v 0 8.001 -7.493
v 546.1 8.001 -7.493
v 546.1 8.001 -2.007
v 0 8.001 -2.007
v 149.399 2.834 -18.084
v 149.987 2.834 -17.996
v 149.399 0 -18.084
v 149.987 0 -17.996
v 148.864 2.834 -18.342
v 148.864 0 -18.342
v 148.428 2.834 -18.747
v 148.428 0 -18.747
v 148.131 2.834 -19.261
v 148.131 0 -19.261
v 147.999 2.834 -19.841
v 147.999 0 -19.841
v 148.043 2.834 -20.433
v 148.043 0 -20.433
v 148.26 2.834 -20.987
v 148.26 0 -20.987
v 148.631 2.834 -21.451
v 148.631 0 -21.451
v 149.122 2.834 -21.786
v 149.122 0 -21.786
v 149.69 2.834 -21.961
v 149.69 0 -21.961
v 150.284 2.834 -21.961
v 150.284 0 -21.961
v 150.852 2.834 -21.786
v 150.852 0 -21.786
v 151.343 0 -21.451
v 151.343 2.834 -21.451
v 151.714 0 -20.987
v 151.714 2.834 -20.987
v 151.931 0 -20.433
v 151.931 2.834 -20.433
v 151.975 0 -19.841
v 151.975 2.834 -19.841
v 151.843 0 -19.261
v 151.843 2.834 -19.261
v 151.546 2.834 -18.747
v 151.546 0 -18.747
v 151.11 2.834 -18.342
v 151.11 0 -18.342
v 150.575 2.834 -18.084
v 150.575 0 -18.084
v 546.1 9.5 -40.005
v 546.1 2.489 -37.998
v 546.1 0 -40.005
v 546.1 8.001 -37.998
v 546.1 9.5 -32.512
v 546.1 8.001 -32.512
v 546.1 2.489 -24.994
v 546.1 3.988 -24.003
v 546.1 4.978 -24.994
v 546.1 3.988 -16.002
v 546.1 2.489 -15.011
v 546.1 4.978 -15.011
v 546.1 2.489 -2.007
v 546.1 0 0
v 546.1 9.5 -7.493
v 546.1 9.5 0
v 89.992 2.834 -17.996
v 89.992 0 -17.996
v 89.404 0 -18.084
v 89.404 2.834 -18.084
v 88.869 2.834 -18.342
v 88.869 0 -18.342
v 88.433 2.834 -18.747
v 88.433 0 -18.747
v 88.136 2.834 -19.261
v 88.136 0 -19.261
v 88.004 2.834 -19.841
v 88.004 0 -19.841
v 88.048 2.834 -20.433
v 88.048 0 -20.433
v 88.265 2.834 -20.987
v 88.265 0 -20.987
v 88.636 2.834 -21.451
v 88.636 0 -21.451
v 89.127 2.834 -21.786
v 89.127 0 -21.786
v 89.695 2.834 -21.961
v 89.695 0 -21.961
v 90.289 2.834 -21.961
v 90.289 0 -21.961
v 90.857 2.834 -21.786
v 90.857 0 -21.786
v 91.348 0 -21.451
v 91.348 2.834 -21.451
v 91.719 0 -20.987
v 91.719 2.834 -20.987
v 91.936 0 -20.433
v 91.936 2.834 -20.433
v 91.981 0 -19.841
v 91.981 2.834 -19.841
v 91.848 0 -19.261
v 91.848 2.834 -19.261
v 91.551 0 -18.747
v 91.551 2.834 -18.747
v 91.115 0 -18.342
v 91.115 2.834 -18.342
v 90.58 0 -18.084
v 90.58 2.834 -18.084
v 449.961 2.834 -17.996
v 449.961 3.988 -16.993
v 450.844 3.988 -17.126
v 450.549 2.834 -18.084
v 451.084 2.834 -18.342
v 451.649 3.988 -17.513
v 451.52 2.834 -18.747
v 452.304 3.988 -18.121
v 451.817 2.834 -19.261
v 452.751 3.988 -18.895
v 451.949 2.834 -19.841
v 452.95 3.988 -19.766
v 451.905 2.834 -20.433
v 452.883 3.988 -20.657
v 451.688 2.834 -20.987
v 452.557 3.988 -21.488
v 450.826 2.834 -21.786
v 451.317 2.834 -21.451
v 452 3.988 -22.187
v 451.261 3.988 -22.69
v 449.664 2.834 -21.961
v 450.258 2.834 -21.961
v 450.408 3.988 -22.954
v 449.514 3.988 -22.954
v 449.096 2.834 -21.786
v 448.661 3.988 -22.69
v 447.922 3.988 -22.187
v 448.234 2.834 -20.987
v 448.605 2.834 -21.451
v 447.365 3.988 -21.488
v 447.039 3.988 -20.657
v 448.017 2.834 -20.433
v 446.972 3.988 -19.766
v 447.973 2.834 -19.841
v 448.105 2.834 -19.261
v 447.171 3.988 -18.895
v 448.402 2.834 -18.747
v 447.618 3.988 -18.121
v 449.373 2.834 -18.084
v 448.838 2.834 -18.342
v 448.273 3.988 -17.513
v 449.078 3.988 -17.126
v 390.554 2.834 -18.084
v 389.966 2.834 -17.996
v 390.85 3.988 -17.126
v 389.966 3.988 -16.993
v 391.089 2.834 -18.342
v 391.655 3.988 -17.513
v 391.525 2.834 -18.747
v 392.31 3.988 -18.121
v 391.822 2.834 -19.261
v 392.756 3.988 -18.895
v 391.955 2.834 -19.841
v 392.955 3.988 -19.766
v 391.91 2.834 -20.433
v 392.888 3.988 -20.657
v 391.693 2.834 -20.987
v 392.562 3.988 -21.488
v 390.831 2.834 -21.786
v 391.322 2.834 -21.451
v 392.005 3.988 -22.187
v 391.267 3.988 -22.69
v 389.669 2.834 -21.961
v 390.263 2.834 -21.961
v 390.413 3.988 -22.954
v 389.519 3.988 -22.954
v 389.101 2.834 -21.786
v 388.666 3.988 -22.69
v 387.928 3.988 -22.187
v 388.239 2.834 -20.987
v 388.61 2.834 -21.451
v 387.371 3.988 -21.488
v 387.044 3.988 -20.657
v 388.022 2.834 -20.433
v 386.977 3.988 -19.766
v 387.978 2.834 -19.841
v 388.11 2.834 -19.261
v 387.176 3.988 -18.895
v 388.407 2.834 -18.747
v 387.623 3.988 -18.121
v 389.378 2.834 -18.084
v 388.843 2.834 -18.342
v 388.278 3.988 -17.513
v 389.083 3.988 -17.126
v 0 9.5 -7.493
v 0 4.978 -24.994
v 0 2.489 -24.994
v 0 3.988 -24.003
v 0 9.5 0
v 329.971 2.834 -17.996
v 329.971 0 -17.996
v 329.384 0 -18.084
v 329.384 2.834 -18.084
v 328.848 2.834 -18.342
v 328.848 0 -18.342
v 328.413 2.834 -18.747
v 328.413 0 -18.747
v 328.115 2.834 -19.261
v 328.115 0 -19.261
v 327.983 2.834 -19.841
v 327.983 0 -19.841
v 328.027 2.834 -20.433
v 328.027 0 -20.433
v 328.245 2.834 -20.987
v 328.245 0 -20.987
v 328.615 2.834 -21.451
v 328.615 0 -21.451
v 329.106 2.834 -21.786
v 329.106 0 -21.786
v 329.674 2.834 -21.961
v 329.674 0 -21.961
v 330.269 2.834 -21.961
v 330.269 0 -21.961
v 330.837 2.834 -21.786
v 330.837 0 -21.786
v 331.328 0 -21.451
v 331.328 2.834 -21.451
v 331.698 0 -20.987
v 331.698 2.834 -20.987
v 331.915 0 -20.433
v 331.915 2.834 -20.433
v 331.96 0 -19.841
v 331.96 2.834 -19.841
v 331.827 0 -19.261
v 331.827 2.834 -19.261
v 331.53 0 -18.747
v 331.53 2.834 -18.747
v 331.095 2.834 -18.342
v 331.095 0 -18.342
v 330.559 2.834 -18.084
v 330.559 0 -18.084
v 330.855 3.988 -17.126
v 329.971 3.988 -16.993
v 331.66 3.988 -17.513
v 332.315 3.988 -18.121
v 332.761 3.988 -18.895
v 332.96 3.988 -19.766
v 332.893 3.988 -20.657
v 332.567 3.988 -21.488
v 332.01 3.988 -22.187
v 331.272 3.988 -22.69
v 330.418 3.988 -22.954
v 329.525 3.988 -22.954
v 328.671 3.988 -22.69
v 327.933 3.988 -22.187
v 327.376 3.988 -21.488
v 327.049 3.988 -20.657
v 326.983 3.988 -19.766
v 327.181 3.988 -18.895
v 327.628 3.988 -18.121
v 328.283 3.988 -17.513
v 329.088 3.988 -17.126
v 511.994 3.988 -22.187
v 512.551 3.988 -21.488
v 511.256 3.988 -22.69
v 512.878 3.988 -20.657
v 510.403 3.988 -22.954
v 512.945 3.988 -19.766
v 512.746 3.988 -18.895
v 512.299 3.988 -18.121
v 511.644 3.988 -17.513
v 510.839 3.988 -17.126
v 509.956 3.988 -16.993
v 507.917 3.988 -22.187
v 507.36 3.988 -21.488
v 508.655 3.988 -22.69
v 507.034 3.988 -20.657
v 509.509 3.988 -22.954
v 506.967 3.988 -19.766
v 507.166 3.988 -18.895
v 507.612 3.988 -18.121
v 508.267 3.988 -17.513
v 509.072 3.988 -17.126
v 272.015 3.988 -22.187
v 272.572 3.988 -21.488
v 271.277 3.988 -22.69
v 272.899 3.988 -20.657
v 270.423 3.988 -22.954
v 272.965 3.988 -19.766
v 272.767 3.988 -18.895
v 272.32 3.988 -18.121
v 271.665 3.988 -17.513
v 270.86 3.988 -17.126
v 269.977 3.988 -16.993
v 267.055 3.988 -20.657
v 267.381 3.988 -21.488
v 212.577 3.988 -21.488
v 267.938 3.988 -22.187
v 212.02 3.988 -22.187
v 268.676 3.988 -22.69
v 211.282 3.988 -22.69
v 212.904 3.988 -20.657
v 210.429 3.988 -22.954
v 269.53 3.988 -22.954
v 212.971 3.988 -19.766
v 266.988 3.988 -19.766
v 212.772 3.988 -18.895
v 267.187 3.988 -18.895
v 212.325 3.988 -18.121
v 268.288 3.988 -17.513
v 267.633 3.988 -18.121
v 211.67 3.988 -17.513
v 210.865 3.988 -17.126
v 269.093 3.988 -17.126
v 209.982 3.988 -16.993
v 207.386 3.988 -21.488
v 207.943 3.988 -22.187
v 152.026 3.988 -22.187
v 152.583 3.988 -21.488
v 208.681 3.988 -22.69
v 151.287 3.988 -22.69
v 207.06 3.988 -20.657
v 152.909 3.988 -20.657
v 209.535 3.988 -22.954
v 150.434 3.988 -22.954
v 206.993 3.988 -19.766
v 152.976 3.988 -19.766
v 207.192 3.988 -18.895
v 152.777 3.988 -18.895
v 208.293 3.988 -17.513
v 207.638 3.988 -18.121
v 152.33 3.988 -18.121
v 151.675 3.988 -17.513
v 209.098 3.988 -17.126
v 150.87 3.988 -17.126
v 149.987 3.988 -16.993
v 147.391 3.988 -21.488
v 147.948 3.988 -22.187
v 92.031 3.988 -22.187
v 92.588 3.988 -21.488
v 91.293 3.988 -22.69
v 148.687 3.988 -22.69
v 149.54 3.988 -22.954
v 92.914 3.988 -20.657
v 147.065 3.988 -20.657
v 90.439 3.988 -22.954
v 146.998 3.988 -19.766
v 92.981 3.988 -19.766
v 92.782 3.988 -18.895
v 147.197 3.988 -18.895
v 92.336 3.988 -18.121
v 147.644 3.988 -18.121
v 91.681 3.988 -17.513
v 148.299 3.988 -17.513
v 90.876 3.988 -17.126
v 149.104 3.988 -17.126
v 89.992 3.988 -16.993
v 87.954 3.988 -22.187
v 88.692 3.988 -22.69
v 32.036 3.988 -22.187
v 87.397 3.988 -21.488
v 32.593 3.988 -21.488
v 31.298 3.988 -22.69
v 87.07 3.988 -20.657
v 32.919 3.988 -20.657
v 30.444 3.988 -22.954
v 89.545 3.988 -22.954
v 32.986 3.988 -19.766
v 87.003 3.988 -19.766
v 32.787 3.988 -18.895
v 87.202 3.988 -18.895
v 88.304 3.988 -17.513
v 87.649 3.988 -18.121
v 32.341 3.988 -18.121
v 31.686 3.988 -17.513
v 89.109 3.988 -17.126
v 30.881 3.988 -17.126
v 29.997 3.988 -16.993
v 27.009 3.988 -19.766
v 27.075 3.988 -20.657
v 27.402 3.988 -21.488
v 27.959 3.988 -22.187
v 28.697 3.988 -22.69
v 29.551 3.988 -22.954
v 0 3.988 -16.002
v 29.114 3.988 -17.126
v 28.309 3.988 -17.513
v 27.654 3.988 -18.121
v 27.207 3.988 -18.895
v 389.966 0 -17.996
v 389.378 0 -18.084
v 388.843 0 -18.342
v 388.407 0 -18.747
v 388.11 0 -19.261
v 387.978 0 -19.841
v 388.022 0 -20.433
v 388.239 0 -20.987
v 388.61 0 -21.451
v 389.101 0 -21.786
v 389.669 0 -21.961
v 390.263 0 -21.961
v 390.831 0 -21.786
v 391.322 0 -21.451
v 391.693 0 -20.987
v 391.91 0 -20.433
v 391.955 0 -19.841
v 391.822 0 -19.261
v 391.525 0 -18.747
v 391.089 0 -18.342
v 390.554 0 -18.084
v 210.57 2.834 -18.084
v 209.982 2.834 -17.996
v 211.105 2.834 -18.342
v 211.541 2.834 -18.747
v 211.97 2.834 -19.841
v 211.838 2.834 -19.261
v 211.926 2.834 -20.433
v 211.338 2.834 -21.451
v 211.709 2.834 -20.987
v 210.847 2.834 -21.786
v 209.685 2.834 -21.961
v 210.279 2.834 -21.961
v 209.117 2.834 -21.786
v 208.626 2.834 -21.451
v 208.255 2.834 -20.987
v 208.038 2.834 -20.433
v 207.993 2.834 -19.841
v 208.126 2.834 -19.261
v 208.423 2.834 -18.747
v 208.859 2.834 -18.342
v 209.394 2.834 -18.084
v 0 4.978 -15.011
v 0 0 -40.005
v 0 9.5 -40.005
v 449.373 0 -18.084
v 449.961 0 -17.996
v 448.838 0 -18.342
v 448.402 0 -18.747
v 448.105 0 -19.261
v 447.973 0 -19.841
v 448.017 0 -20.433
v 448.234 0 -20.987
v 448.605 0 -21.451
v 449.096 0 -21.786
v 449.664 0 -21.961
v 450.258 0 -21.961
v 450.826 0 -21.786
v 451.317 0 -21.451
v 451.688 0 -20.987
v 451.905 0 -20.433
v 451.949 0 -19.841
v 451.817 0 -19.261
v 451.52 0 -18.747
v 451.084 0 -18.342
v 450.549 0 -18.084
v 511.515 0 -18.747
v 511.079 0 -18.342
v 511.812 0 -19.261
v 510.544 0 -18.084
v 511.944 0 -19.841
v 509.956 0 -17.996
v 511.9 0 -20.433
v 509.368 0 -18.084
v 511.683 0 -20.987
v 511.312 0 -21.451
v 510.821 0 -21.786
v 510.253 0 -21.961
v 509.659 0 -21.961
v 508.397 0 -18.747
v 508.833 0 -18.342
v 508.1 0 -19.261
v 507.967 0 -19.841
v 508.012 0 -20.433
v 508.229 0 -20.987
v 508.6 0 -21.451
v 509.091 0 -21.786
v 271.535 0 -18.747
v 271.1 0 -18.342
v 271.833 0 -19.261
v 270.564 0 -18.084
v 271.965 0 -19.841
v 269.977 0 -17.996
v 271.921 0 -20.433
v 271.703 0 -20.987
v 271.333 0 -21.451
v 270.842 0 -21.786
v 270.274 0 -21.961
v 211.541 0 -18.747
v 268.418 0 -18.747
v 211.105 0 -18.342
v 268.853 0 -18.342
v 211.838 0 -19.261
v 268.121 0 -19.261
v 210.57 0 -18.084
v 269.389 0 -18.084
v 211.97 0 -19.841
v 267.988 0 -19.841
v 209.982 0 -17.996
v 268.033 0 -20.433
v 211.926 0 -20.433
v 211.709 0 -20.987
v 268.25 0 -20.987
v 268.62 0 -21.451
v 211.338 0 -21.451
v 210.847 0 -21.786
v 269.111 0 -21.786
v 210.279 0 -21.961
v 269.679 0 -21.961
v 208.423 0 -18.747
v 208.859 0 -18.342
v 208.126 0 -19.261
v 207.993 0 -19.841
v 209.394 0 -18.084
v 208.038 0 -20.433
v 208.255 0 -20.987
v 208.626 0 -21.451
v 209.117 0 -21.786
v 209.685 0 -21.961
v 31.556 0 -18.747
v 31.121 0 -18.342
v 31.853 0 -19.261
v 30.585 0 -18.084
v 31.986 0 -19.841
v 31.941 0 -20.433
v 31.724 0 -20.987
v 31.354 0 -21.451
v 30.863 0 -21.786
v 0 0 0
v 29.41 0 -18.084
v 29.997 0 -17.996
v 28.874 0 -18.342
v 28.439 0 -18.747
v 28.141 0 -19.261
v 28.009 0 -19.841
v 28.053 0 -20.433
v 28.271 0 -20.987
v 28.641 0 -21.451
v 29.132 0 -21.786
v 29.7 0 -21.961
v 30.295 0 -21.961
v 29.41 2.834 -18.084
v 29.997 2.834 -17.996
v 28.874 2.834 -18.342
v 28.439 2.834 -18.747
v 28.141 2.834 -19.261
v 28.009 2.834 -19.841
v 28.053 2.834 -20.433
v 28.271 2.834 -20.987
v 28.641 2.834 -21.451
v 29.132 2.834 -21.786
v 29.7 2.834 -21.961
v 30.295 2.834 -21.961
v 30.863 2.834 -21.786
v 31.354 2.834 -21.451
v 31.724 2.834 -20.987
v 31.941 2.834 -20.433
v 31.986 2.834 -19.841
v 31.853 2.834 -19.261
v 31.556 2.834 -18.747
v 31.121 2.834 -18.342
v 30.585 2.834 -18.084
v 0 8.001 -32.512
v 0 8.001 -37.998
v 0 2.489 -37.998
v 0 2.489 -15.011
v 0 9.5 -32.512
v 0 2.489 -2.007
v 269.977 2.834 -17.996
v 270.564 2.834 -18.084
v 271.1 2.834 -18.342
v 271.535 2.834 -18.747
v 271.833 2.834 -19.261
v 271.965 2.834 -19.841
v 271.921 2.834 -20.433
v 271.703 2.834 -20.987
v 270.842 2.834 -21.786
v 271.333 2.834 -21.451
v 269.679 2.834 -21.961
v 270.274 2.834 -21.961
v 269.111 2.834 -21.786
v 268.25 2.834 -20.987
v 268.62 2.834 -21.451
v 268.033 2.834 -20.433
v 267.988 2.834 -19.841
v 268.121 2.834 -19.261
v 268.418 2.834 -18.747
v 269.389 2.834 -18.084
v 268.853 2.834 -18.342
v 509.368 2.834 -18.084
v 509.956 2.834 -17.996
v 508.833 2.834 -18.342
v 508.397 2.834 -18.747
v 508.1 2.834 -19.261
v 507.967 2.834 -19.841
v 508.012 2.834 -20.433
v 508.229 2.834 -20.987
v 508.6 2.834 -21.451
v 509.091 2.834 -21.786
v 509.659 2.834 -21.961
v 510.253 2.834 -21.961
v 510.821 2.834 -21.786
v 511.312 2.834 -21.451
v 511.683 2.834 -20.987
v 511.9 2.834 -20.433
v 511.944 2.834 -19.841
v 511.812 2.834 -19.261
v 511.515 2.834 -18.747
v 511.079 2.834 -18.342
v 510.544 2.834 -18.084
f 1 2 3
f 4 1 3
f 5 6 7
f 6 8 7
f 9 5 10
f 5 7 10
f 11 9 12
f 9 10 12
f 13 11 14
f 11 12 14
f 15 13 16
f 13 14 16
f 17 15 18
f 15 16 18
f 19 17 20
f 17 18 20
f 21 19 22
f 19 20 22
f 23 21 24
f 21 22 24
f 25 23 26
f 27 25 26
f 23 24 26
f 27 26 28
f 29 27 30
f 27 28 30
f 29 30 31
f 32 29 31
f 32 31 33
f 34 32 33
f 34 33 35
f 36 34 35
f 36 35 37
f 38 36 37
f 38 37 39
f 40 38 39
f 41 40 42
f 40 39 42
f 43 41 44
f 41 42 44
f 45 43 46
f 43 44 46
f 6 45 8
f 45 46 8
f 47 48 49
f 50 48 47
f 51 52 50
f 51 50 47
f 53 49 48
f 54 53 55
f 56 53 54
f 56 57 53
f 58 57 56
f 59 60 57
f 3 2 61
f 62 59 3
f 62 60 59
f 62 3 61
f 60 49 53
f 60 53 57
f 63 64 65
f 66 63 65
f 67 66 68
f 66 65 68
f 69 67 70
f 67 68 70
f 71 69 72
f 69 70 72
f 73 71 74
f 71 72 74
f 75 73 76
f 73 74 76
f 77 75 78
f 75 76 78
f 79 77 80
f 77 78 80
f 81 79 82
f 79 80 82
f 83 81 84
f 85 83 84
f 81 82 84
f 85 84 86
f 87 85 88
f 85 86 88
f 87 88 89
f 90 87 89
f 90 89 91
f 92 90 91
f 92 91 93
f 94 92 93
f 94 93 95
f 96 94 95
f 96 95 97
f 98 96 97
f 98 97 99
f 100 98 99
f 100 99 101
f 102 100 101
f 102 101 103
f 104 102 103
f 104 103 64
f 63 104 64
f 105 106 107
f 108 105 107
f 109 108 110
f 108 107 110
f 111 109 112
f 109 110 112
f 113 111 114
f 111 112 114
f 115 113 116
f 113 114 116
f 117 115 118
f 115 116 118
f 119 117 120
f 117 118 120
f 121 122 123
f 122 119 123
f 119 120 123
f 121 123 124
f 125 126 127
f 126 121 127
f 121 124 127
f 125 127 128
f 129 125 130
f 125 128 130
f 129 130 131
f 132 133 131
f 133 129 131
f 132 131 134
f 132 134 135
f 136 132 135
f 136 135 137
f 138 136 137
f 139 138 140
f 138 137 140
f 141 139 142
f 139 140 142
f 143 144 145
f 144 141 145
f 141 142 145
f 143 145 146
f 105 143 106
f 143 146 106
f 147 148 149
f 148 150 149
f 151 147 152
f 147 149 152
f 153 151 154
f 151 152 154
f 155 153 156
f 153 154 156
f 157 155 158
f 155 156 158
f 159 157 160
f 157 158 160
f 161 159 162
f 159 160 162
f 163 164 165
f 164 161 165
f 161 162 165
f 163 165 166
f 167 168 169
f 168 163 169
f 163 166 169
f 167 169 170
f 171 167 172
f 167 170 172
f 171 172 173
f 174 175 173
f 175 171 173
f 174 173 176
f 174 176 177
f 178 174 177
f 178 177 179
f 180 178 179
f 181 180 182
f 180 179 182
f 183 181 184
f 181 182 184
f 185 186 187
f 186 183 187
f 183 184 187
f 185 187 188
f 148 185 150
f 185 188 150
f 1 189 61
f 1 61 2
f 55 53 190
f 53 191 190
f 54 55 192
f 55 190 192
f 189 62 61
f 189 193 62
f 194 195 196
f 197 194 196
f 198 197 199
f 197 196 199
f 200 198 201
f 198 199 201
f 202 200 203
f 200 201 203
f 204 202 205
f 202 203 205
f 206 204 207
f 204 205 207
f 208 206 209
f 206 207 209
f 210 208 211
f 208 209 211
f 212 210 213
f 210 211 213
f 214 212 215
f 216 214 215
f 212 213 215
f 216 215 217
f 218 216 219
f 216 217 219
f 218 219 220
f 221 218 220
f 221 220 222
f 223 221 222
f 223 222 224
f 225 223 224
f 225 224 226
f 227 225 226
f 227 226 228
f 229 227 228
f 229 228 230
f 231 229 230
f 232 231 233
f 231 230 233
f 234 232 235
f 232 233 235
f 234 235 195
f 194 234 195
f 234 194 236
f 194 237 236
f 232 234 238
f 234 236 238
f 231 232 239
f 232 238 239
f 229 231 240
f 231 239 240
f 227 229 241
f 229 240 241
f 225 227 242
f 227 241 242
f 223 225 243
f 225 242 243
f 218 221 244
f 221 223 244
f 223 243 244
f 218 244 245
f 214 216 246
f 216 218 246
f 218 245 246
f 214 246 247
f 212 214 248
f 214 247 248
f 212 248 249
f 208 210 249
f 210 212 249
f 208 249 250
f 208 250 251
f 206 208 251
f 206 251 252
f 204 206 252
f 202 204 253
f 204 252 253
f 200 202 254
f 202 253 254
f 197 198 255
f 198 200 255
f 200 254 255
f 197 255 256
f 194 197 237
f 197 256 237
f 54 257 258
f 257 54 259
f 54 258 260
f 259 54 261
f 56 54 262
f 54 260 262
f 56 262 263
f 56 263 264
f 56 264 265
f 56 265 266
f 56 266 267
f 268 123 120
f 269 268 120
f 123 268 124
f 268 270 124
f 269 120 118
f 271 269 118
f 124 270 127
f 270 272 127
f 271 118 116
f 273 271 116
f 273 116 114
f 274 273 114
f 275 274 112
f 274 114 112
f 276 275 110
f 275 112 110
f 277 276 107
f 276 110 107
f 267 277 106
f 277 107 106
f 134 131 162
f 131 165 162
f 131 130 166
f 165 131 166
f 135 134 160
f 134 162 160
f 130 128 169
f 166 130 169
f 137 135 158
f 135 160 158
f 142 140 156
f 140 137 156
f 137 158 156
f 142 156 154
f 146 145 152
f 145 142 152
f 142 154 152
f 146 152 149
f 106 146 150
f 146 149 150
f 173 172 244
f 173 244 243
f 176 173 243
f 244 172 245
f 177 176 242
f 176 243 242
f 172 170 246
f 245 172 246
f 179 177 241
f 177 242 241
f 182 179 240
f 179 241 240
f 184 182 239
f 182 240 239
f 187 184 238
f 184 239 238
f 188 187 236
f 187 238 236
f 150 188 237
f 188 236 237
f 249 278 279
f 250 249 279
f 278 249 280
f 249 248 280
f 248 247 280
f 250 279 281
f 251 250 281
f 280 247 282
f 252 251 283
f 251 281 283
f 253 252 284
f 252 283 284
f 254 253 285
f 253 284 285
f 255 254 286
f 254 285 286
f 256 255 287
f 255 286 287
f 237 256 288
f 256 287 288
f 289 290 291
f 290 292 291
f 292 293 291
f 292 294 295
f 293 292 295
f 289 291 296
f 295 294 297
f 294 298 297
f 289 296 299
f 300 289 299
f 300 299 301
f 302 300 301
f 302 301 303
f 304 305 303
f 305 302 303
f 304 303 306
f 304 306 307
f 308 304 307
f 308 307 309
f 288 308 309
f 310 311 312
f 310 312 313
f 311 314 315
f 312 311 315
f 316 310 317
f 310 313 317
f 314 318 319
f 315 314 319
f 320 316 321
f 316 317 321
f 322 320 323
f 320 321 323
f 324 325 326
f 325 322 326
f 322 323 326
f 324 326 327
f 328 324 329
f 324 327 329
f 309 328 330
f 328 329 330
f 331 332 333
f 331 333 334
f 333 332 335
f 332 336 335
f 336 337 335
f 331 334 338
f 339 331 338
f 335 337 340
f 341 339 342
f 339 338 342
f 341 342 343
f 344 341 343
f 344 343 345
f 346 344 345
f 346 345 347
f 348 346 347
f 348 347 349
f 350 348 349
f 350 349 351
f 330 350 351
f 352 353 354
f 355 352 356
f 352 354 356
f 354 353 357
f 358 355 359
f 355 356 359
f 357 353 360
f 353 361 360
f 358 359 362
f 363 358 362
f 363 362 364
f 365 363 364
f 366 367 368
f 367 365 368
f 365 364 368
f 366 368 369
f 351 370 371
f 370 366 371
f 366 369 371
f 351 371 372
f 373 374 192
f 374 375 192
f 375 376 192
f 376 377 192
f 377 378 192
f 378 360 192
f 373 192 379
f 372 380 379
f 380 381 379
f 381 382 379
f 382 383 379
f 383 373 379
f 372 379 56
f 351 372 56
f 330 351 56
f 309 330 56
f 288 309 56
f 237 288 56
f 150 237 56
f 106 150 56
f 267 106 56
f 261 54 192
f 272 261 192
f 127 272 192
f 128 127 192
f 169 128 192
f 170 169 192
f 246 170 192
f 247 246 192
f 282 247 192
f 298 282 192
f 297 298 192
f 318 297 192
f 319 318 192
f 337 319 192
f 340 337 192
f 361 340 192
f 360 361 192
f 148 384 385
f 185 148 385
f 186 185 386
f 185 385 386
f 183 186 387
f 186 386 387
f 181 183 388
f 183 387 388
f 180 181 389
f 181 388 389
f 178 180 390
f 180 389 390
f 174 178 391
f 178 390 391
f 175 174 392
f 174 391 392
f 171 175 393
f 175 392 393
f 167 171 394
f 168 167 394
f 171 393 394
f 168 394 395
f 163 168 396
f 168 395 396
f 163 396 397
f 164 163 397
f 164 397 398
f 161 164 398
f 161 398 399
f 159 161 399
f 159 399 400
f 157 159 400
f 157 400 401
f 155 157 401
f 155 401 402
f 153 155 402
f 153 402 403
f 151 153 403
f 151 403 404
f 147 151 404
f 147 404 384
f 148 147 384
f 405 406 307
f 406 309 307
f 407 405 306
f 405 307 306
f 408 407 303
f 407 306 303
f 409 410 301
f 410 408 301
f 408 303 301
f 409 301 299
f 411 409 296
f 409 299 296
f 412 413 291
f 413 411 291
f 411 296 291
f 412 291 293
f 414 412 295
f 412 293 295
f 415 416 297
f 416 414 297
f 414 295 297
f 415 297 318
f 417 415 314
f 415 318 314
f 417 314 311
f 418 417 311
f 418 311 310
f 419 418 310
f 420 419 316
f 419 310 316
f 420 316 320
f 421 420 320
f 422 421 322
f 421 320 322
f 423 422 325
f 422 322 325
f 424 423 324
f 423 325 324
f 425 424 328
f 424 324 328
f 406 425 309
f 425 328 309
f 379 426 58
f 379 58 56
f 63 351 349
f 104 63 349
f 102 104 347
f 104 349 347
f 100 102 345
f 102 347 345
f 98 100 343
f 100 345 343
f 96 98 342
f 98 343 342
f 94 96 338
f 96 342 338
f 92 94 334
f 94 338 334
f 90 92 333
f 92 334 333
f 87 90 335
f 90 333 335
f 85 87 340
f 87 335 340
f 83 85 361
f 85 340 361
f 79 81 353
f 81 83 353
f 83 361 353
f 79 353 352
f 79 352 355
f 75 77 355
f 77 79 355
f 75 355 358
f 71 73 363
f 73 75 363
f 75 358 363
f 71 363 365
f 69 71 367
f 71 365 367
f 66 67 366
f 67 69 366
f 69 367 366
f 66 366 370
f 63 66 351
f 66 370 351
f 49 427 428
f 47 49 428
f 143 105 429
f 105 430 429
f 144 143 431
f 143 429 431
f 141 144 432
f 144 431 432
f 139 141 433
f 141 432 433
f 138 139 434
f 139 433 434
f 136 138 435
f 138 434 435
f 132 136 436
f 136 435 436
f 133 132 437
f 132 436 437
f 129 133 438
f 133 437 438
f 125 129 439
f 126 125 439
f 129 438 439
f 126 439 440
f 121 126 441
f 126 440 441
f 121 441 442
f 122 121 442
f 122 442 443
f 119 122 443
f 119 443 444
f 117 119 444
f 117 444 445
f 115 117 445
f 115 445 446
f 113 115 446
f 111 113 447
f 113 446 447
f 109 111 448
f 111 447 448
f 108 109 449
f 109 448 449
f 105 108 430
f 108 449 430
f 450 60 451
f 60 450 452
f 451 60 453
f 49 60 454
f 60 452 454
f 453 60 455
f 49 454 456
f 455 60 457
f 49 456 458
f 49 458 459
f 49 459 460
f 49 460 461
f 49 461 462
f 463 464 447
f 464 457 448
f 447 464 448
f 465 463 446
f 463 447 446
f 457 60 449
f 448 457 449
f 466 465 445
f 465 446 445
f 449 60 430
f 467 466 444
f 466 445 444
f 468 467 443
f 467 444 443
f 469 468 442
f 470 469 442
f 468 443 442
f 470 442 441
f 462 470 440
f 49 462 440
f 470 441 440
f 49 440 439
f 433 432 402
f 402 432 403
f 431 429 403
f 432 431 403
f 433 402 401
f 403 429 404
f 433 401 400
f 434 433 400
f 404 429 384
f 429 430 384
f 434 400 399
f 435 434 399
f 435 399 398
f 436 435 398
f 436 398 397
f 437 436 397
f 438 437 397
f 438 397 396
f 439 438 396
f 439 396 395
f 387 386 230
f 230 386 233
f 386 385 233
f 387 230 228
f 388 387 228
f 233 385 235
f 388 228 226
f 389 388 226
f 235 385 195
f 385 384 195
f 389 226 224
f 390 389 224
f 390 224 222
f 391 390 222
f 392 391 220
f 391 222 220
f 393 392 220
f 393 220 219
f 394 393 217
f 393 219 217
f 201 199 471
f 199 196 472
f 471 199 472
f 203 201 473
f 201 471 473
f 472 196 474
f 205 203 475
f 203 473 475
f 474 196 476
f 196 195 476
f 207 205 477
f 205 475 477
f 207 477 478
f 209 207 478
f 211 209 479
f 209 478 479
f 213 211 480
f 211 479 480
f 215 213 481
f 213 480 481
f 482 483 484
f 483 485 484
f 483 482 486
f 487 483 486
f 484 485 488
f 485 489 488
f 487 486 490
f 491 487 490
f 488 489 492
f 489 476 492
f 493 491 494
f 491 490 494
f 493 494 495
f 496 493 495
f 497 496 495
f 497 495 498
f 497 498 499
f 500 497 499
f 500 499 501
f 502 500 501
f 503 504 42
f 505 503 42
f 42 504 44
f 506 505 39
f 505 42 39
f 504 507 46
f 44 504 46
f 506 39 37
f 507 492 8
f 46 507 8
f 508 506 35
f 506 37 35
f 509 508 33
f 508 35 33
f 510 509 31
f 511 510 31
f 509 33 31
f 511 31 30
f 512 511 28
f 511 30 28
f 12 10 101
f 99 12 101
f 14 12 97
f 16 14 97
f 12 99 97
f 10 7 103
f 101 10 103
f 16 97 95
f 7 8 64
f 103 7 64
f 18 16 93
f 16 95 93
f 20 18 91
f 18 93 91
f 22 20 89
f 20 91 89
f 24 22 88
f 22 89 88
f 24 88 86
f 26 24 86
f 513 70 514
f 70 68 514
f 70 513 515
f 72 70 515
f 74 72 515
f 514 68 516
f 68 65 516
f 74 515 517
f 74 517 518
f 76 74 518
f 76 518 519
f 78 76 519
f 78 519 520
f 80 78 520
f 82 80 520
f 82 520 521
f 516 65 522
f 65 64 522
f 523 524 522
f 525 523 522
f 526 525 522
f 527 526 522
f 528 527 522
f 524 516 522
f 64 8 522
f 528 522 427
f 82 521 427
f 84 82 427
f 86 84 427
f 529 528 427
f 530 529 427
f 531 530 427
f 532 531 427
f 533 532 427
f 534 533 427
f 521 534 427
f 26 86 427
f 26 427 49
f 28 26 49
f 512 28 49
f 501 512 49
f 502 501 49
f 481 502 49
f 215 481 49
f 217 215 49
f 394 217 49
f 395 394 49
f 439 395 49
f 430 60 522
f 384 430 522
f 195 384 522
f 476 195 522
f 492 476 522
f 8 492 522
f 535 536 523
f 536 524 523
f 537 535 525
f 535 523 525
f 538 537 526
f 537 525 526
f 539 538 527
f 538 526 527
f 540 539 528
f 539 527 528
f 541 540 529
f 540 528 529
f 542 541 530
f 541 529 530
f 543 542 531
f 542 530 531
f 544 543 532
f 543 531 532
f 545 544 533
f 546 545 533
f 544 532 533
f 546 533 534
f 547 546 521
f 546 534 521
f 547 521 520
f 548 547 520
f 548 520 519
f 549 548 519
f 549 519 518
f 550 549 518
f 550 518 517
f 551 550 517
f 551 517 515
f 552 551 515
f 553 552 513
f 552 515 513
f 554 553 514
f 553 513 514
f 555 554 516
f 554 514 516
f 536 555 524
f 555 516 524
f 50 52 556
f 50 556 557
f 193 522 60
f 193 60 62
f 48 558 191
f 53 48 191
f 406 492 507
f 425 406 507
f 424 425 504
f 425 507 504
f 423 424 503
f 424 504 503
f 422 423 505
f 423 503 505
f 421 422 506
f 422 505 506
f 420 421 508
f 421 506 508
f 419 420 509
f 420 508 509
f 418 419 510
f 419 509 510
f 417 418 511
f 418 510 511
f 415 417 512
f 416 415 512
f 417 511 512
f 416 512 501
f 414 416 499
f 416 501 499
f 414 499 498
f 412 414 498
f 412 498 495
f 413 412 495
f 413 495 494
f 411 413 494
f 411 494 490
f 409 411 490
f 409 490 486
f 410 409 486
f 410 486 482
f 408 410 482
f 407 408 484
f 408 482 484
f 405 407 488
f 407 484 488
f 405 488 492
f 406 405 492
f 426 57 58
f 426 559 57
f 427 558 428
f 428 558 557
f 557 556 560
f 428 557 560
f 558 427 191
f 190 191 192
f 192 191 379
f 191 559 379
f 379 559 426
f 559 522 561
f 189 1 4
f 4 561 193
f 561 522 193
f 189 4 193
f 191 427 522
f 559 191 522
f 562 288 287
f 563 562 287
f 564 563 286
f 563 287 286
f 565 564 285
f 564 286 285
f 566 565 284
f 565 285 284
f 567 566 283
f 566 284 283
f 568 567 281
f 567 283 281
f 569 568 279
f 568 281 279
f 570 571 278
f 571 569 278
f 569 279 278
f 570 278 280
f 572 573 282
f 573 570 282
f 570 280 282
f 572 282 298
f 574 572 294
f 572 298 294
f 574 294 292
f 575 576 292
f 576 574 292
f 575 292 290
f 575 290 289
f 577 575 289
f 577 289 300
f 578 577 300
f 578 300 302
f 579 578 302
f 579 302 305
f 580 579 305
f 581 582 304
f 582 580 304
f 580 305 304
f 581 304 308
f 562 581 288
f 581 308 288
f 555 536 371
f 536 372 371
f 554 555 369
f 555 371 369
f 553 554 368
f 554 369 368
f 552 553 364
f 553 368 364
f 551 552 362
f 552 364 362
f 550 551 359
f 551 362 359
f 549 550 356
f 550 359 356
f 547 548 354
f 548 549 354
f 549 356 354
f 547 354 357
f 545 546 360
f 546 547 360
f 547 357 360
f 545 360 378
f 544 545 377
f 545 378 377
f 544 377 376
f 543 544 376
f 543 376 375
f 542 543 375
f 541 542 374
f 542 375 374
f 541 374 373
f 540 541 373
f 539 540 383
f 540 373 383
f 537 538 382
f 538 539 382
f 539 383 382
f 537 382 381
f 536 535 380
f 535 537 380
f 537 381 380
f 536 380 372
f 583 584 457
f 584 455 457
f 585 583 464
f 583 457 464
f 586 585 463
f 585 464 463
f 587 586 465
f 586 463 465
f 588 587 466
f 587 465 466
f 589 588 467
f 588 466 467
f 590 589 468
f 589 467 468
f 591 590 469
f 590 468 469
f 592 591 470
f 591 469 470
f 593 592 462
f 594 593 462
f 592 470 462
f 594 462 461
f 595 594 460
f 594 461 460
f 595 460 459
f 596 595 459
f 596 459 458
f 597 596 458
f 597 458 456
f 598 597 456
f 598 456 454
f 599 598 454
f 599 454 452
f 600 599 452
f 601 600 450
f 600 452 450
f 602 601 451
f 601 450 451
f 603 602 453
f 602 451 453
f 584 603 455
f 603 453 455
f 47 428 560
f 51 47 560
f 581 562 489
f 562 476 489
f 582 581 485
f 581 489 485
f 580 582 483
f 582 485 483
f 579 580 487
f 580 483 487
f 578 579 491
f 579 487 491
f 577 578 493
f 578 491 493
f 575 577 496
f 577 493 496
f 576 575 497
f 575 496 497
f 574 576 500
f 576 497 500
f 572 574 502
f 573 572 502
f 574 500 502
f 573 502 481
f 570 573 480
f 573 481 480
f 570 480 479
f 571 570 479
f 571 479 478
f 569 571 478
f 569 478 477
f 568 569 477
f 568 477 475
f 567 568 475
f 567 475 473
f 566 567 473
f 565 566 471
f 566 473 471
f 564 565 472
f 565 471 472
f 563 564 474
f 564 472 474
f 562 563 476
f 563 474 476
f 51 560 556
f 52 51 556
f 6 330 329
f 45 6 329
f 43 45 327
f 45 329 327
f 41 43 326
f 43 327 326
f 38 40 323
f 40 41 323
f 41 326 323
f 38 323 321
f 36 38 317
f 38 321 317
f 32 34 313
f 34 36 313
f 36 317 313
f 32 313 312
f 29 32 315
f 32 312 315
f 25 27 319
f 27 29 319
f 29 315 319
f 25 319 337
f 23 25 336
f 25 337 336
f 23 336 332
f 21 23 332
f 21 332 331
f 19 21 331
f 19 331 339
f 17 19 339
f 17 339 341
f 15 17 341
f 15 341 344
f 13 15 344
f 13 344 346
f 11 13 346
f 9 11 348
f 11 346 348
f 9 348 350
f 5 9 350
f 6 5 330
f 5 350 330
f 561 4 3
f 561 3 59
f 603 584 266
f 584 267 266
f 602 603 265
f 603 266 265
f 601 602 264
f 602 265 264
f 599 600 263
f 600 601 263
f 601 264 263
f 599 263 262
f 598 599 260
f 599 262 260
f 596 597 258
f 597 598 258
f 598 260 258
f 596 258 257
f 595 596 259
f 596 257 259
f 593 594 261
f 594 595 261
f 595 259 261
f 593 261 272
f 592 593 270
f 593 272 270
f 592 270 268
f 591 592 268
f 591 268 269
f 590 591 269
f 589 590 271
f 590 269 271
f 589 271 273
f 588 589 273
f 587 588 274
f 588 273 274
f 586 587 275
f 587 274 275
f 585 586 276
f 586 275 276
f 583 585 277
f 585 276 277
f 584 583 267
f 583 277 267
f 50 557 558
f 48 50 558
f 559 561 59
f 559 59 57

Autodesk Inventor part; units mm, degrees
ref_plane "YZ Plane" through (0, 0, 0) normal (1, 0, 0) x (0, 1, 0)
ref_plane "XZ Plane" through (0, 0, 0) normal (0, 1, 0) x (-1, 0, 0)
ref_plane "XY Plane" through (0, 0, 0) normal (0, 0, 1) x (1, 0, 0)
sketch "Sketch1" plane through (0, 0, 0) normal (1, 0, 0) x (0, 1, 0)
  line L0 (0, 0) -> (0, -40.005)
  line L1 (0, -40.005) -> (9.4996, -40.005)
  line L2 (0, 0) -> (9.4996, 0)
  line L3 (9.4996, 0) -> (9.4996, -7.493)
  line L4 (9.4996, 0) -> (16.9926, 0) construction
  line L5 (9.4996, -40.005) -> (9.4996, -32.512)
  line L6 (9.4996, -40.005) -> (16.9926, -40.005) construction
  line L7 (9.4996, -7.493) -> (8.001, -7.493)
  line L8 (9.4996, -32.512) -> (8.001, -32.512)
  line L9 (9.4996, -32.512) -> (10.9982, -32.512) construction
  line L10 (8.001, -7.493) -> (8.001, -2.0066)
  line L11 (8.001, -7.493) -> (13.4874, -7.493) construction
  line L12 (8.001, -32.512) -> (8.001, -37.9984)
  line L13 (8.001, -32.512) -> (13.4874, -32.512) construction
  line L14 (8.001, -2.0066) -> (2.4892, -2.0066)
  line L15 (2.4892, -2.0066) -> (2.4892, -15.0114)
  line L16 (2.4892, -15.0114) -> (4.9784, -15.0114)
  line L17 (8.001, -37.9984) -> (2.4892, -37.9984)
  line L18 (8.001, -37.9984) -> (13.5128, -37.9984) construction
  line L19 (2.4892, -37.9984) -> (2.4892, -24.9936)
  line L20 (2.4892, -24.9936) -> (4.9784, -24.9936)
  line L21 (4.9784, -15.0114) -> (3.9878, -15.0114) construction
  line L22 (3.9878, -15.0114) -> (3.9878, -24.9936) construction
  line L23 (4.9784, -15.0114) -> (3.9878, -16.002)
  line L24 (4.9784, -15.0114) -> (6.3793, -15.0114) construction
  line L25 (4.9784, -24.9936) -> (3.9878, -24.003)
  line L26 (4.9784, -24.9936) -> (6.3793, -24.9936) construction
  line L27 (3.9878, -24.003) -> (3.9878, -16.002)
  dimension "d0" = 40.005
  dimension "d1" = 9.4996
  dimension "d2" = 9.4996
  dimension "d3" = 7.493
  dimension "d4" = 90
  dimension "d5" = 7.493
  dimension "d6" = 90
  dimension "d7" = 1.4986
  dimension "d8" = 1.4986
  dimension "d9" = 180
  dimension "d10" = 5.4864
  dimension "d11" = 90
  dimension "d12" = 5.4864
  dimension "d13" = 90
  dimension "d22" = 5.5118
  dimension "d23" = 13.0048
  dimension "d24" = 2.4892
  dimension "d25" = 90
  dimension "d26" = 5.5118
  dimension "d27" = 180
  dimension "d28" = 13.0048
  dimension "d29" = 90
  dimension "d30" = 2.4892
  dimension "d31" = 90
  dimension "d32" = 0.9906
  dimension "d33" = 135
  dimension "d34" = 135
extrude "Extrusion1" add sketch "Sketch1" along normal blind 546.1
sketch "Sketch2" plane through (0, 3.9878, -16.002) normal (0, 1, 0) x (1, 0, 0)
  line L0 (0, 8.001) -> (0, 0) projected
  line L1 (0, 0) -> (546.1, 0) projected
  line L2 (546.1, 8.001) -> (546.1, 0) projected
  line L3 (0, 8.001) -> (546.1, 8.001) projected
  point P0 (0, -16.002)
  point P1 (29.9974, 3.9878)
  dimension "d37" = 29.9974
  dimension "d38" = 3.9878
hole "Hole1" at (29.9974, 3.9878, -19.9898) direction (0, -1, 0) diameter 3.9878 end through all countersink diameter 5.9944 countersink angle 82
pattern_linear "Rectangular Pattern1" count 9 spacing 59.9948 along (1, 0, 0) of "Hole1"
properties part number "aluminum slider"
